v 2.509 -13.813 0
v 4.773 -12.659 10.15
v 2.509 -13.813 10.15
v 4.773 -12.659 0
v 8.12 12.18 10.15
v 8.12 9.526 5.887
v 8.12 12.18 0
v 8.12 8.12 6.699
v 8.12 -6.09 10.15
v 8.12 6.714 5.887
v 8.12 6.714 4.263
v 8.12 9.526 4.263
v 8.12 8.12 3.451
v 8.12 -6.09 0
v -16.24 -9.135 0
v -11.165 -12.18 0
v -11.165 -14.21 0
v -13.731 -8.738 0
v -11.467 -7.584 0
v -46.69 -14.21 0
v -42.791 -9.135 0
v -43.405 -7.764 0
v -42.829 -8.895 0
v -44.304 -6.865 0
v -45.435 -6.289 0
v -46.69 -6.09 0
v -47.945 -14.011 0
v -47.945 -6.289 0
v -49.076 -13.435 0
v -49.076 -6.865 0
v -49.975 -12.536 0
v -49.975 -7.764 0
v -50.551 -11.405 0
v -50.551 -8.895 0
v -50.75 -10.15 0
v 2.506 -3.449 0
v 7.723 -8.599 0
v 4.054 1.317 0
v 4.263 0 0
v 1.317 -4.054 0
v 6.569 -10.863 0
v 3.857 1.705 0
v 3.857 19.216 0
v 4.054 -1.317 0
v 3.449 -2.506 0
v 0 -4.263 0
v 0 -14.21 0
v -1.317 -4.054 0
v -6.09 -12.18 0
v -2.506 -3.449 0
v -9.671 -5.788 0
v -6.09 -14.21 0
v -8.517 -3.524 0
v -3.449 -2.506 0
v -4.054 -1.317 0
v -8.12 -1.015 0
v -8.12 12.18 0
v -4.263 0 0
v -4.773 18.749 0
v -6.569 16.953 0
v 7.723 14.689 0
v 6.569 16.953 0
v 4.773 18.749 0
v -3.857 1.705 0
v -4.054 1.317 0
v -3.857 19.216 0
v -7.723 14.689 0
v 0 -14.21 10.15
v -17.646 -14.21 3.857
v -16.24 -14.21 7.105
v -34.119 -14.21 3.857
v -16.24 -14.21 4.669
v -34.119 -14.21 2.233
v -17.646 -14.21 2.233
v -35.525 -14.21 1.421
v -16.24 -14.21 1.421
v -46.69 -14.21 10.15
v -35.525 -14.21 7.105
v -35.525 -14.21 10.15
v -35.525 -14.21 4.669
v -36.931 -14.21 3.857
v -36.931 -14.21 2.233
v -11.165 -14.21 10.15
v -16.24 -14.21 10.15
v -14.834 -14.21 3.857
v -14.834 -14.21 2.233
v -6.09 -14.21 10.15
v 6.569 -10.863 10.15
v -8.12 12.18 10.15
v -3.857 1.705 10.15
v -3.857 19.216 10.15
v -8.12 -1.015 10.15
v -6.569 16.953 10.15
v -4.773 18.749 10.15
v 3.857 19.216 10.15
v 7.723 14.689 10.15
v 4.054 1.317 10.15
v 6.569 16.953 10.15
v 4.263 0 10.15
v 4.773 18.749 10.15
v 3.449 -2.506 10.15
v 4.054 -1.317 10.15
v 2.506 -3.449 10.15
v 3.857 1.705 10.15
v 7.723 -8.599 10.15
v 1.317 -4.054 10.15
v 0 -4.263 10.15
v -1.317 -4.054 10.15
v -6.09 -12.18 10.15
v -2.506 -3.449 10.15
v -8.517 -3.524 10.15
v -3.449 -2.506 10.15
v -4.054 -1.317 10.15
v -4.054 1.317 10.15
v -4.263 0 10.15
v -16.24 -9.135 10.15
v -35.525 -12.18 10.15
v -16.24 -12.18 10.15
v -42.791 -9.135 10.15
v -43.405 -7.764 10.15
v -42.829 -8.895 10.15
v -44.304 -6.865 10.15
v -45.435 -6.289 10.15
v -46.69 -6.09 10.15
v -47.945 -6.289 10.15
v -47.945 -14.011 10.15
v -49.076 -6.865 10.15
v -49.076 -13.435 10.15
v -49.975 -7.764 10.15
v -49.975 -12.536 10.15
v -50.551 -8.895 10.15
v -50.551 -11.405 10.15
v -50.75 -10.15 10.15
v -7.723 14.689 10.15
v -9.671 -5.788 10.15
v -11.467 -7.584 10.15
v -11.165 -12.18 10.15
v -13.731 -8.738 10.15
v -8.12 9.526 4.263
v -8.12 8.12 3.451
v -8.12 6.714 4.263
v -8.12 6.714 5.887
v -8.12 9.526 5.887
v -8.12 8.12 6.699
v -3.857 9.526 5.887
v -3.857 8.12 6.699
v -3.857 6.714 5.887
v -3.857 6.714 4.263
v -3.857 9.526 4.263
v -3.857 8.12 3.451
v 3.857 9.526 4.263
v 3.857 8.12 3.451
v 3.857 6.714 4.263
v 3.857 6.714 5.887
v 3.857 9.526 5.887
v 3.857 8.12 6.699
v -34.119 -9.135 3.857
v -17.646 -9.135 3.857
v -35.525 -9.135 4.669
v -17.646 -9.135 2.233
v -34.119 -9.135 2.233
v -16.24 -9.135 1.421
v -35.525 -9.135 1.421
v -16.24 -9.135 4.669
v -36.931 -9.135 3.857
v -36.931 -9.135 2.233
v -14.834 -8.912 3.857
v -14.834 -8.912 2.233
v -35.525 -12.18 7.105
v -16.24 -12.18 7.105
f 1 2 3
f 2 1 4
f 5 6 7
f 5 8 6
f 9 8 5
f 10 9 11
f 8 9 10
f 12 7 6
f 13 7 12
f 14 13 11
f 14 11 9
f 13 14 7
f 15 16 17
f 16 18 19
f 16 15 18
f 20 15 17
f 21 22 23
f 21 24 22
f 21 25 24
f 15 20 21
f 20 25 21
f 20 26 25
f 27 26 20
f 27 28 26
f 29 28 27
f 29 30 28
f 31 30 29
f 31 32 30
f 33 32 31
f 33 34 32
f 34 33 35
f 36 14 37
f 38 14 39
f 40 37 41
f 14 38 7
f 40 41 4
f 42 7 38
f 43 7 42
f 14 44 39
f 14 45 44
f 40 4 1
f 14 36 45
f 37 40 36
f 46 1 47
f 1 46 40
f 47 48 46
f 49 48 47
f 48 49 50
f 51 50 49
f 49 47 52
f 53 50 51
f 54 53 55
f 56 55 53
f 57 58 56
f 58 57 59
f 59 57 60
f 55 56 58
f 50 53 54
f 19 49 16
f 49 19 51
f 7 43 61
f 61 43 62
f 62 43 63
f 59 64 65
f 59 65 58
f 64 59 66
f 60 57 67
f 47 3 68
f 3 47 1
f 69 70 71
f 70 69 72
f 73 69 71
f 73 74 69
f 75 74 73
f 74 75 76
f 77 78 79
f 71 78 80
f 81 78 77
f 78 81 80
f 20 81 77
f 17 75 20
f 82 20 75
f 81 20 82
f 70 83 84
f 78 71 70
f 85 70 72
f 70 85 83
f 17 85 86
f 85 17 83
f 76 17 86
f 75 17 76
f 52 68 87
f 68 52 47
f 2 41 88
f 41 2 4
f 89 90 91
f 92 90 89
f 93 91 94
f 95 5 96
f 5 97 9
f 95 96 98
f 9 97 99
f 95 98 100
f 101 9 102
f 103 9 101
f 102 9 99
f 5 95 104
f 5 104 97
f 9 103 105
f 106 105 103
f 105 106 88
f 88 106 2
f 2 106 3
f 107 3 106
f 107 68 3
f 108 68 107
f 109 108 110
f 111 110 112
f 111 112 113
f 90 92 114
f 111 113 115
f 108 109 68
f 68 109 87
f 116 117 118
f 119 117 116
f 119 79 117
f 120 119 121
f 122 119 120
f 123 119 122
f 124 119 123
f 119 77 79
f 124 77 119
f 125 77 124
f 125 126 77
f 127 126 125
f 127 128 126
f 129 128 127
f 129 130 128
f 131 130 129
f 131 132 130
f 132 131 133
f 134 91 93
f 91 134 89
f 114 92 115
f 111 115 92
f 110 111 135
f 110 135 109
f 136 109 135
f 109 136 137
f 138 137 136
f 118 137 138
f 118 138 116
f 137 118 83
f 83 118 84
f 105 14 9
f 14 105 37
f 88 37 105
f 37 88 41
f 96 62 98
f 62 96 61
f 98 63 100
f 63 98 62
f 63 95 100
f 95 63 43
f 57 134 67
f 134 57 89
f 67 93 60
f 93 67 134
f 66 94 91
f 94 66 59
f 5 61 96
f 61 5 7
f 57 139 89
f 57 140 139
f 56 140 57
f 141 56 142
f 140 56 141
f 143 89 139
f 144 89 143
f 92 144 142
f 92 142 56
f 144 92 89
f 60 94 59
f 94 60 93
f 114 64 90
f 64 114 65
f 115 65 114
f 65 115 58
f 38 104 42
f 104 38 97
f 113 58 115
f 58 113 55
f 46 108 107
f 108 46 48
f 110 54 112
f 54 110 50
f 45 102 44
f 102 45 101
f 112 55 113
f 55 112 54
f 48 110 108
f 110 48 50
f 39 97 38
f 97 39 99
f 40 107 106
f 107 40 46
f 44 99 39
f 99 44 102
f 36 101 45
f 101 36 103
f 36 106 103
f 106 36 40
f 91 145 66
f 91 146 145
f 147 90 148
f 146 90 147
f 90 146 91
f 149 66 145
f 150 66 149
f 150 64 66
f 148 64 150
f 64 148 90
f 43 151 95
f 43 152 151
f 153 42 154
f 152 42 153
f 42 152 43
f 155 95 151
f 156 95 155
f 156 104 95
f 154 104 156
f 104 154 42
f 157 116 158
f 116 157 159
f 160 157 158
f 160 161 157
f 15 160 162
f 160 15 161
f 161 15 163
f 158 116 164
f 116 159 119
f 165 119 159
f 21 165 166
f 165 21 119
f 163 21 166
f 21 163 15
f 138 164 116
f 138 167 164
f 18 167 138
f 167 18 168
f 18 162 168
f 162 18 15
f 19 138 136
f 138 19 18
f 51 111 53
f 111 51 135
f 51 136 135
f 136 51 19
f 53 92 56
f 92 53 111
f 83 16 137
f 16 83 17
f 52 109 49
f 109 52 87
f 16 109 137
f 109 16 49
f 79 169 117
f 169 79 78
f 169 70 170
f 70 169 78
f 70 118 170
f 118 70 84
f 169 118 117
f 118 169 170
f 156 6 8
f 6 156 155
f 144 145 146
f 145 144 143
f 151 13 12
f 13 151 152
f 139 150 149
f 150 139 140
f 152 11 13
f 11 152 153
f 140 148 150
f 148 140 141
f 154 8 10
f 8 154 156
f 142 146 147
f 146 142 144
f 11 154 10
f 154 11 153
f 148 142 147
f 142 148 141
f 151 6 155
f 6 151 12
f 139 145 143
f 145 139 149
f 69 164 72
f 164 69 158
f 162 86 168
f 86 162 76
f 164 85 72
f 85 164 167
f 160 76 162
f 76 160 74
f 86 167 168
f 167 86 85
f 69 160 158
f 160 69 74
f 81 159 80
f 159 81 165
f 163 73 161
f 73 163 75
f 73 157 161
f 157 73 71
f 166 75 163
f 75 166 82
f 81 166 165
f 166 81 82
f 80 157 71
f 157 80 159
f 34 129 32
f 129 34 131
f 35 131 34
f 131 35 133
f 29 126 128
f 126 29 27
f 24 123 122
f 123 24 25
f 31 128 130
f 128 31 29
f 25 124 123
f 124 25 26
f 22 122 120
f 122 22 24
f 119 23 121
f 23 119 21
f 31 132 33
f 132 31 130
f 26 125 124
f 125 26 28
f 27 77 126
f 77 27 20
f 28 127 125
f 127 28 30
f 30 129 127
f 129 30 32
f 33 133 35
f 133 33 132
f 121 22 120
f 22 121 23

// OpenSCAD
// file: endstops.scad
include <configuration.scad>

rod_spacing = x_rod_spacing;

//! x_endstop_bumper();

scale([1.015, 1.015, 1.015]){
	rotate([0,180,0]){
		translate([0,0,-10]){
			x_endstop(1);
		}
	}
}

module x_endstop_bumper(){
	rotate([90,0,0])
		linear_extrude(height=20)
			polygon( points=[[0,0],[12,0],[12,12]]);

}



module x_endstop(for_x_axis=0){

	union(){
	
		difference(){
	
			union(){
				
				hull(){
	
					cylinder(r=8, h=10, $fn=20);
					translate([rod_spacing, 0, 0])
						cylinder(r=8, h=10, $fn=20);
	
					translate([0, -6, 0]){
					cylinder(r=8, h=10, $fn=20);
					translate([rod_spacing, 0, 0])
						cylinder(r=8, h=10, $fn=20);
					}
				}
	
				hull(){
	
					cylinder(r=8, h=10, $fn=20);
					translate([0, 12, 0])
						cylinder(r=8, h=10, $fn=20);
	
				}
		
	
			}
	
			union(){
	
				translate([0,0,-1]){
	
					#cylinder(r=4.2, h=12, $fn=20);
					translate([-3.8,0,0])
						#cube([7.6,20,12]);
	
					translate([rod_spacing, 0, 0]){
						#cylinder(r=4.2, h=12, $fn=20);
						translate([-3.8,0,0])
							#cube([7.6,20,12]);
	
					}
	
					translate([16, -1, 0]){
						hull(){
	
							#cylinder(r=8, h=12, $fn=20);
							translate([rod_spacing - 32, 0, 0])
								#cylinder(r=8, h=12, $fn=20);
	
							translate([0, 16, 0]){
								#cylinder(r=8, h=12, $fn=20);
								translate([rod_spacing - 32, 0, 0])
									#cylinder(r=8, h=12, $fn=20);
							}
						}
	
					}
	
					translate([6, -15, 0]){
						#cube([5,3,12]);
					}
	
					translate([16, -15, 0]){
						#cube([19,3,4]);
					}
					
					if(!for_x_axis){
		
						translate([46, -15, 0]){
							#cube([40,40,13]);		
						}	
					}
	
				}
				
				translate([-10, 8, 5])
				rotate([0,90,0])
				#cylinder(r=1.6, h=20);
	
				translate([16, -4, 7])
				rotate([90,90,0])
				#cylinder(r=1.6, h=20);
	
				translate([35, -4, 7])   // 19mm spacing for pcb holes
				rotate([90,90,0])
				#cylinder(r=1.6, h=20);
	
				
	
	
	
			}
	
		}  // end diff
	
		if(!for_x_axis){
				translate([46, -10, 0])
				cylinder(r=4, h=10, $fn=20);
		}

	}    // end outer union

}
// file: configuration.scad
rod_radius = 6.0;
frame_rod_radius = 4.0;
z_threaded_rod_radius = 4.0;

y_rod_height = 70;
x_rod_spacing = 70;

bearing_radius = 11; 					// 608 bearing

//  LM8 = 7.5  LM10 = 9.5  LM12 = 10.5
linear_bearing_radius =  7.6;  // LM8 + some extra space

z_threaded_to_smooth_spacing = 30;   // 30mm is OK for 8mm rods 
x_end_threaded_rod_height = 20;
// main file
include <configuration.scad>
use <endstops.scad>

scale([1.015, 1.015, 1.015]){
	rotate([0,180,0]){
		translate([0,0,-10]){
			x_endstop(0);
		}
	}
}
